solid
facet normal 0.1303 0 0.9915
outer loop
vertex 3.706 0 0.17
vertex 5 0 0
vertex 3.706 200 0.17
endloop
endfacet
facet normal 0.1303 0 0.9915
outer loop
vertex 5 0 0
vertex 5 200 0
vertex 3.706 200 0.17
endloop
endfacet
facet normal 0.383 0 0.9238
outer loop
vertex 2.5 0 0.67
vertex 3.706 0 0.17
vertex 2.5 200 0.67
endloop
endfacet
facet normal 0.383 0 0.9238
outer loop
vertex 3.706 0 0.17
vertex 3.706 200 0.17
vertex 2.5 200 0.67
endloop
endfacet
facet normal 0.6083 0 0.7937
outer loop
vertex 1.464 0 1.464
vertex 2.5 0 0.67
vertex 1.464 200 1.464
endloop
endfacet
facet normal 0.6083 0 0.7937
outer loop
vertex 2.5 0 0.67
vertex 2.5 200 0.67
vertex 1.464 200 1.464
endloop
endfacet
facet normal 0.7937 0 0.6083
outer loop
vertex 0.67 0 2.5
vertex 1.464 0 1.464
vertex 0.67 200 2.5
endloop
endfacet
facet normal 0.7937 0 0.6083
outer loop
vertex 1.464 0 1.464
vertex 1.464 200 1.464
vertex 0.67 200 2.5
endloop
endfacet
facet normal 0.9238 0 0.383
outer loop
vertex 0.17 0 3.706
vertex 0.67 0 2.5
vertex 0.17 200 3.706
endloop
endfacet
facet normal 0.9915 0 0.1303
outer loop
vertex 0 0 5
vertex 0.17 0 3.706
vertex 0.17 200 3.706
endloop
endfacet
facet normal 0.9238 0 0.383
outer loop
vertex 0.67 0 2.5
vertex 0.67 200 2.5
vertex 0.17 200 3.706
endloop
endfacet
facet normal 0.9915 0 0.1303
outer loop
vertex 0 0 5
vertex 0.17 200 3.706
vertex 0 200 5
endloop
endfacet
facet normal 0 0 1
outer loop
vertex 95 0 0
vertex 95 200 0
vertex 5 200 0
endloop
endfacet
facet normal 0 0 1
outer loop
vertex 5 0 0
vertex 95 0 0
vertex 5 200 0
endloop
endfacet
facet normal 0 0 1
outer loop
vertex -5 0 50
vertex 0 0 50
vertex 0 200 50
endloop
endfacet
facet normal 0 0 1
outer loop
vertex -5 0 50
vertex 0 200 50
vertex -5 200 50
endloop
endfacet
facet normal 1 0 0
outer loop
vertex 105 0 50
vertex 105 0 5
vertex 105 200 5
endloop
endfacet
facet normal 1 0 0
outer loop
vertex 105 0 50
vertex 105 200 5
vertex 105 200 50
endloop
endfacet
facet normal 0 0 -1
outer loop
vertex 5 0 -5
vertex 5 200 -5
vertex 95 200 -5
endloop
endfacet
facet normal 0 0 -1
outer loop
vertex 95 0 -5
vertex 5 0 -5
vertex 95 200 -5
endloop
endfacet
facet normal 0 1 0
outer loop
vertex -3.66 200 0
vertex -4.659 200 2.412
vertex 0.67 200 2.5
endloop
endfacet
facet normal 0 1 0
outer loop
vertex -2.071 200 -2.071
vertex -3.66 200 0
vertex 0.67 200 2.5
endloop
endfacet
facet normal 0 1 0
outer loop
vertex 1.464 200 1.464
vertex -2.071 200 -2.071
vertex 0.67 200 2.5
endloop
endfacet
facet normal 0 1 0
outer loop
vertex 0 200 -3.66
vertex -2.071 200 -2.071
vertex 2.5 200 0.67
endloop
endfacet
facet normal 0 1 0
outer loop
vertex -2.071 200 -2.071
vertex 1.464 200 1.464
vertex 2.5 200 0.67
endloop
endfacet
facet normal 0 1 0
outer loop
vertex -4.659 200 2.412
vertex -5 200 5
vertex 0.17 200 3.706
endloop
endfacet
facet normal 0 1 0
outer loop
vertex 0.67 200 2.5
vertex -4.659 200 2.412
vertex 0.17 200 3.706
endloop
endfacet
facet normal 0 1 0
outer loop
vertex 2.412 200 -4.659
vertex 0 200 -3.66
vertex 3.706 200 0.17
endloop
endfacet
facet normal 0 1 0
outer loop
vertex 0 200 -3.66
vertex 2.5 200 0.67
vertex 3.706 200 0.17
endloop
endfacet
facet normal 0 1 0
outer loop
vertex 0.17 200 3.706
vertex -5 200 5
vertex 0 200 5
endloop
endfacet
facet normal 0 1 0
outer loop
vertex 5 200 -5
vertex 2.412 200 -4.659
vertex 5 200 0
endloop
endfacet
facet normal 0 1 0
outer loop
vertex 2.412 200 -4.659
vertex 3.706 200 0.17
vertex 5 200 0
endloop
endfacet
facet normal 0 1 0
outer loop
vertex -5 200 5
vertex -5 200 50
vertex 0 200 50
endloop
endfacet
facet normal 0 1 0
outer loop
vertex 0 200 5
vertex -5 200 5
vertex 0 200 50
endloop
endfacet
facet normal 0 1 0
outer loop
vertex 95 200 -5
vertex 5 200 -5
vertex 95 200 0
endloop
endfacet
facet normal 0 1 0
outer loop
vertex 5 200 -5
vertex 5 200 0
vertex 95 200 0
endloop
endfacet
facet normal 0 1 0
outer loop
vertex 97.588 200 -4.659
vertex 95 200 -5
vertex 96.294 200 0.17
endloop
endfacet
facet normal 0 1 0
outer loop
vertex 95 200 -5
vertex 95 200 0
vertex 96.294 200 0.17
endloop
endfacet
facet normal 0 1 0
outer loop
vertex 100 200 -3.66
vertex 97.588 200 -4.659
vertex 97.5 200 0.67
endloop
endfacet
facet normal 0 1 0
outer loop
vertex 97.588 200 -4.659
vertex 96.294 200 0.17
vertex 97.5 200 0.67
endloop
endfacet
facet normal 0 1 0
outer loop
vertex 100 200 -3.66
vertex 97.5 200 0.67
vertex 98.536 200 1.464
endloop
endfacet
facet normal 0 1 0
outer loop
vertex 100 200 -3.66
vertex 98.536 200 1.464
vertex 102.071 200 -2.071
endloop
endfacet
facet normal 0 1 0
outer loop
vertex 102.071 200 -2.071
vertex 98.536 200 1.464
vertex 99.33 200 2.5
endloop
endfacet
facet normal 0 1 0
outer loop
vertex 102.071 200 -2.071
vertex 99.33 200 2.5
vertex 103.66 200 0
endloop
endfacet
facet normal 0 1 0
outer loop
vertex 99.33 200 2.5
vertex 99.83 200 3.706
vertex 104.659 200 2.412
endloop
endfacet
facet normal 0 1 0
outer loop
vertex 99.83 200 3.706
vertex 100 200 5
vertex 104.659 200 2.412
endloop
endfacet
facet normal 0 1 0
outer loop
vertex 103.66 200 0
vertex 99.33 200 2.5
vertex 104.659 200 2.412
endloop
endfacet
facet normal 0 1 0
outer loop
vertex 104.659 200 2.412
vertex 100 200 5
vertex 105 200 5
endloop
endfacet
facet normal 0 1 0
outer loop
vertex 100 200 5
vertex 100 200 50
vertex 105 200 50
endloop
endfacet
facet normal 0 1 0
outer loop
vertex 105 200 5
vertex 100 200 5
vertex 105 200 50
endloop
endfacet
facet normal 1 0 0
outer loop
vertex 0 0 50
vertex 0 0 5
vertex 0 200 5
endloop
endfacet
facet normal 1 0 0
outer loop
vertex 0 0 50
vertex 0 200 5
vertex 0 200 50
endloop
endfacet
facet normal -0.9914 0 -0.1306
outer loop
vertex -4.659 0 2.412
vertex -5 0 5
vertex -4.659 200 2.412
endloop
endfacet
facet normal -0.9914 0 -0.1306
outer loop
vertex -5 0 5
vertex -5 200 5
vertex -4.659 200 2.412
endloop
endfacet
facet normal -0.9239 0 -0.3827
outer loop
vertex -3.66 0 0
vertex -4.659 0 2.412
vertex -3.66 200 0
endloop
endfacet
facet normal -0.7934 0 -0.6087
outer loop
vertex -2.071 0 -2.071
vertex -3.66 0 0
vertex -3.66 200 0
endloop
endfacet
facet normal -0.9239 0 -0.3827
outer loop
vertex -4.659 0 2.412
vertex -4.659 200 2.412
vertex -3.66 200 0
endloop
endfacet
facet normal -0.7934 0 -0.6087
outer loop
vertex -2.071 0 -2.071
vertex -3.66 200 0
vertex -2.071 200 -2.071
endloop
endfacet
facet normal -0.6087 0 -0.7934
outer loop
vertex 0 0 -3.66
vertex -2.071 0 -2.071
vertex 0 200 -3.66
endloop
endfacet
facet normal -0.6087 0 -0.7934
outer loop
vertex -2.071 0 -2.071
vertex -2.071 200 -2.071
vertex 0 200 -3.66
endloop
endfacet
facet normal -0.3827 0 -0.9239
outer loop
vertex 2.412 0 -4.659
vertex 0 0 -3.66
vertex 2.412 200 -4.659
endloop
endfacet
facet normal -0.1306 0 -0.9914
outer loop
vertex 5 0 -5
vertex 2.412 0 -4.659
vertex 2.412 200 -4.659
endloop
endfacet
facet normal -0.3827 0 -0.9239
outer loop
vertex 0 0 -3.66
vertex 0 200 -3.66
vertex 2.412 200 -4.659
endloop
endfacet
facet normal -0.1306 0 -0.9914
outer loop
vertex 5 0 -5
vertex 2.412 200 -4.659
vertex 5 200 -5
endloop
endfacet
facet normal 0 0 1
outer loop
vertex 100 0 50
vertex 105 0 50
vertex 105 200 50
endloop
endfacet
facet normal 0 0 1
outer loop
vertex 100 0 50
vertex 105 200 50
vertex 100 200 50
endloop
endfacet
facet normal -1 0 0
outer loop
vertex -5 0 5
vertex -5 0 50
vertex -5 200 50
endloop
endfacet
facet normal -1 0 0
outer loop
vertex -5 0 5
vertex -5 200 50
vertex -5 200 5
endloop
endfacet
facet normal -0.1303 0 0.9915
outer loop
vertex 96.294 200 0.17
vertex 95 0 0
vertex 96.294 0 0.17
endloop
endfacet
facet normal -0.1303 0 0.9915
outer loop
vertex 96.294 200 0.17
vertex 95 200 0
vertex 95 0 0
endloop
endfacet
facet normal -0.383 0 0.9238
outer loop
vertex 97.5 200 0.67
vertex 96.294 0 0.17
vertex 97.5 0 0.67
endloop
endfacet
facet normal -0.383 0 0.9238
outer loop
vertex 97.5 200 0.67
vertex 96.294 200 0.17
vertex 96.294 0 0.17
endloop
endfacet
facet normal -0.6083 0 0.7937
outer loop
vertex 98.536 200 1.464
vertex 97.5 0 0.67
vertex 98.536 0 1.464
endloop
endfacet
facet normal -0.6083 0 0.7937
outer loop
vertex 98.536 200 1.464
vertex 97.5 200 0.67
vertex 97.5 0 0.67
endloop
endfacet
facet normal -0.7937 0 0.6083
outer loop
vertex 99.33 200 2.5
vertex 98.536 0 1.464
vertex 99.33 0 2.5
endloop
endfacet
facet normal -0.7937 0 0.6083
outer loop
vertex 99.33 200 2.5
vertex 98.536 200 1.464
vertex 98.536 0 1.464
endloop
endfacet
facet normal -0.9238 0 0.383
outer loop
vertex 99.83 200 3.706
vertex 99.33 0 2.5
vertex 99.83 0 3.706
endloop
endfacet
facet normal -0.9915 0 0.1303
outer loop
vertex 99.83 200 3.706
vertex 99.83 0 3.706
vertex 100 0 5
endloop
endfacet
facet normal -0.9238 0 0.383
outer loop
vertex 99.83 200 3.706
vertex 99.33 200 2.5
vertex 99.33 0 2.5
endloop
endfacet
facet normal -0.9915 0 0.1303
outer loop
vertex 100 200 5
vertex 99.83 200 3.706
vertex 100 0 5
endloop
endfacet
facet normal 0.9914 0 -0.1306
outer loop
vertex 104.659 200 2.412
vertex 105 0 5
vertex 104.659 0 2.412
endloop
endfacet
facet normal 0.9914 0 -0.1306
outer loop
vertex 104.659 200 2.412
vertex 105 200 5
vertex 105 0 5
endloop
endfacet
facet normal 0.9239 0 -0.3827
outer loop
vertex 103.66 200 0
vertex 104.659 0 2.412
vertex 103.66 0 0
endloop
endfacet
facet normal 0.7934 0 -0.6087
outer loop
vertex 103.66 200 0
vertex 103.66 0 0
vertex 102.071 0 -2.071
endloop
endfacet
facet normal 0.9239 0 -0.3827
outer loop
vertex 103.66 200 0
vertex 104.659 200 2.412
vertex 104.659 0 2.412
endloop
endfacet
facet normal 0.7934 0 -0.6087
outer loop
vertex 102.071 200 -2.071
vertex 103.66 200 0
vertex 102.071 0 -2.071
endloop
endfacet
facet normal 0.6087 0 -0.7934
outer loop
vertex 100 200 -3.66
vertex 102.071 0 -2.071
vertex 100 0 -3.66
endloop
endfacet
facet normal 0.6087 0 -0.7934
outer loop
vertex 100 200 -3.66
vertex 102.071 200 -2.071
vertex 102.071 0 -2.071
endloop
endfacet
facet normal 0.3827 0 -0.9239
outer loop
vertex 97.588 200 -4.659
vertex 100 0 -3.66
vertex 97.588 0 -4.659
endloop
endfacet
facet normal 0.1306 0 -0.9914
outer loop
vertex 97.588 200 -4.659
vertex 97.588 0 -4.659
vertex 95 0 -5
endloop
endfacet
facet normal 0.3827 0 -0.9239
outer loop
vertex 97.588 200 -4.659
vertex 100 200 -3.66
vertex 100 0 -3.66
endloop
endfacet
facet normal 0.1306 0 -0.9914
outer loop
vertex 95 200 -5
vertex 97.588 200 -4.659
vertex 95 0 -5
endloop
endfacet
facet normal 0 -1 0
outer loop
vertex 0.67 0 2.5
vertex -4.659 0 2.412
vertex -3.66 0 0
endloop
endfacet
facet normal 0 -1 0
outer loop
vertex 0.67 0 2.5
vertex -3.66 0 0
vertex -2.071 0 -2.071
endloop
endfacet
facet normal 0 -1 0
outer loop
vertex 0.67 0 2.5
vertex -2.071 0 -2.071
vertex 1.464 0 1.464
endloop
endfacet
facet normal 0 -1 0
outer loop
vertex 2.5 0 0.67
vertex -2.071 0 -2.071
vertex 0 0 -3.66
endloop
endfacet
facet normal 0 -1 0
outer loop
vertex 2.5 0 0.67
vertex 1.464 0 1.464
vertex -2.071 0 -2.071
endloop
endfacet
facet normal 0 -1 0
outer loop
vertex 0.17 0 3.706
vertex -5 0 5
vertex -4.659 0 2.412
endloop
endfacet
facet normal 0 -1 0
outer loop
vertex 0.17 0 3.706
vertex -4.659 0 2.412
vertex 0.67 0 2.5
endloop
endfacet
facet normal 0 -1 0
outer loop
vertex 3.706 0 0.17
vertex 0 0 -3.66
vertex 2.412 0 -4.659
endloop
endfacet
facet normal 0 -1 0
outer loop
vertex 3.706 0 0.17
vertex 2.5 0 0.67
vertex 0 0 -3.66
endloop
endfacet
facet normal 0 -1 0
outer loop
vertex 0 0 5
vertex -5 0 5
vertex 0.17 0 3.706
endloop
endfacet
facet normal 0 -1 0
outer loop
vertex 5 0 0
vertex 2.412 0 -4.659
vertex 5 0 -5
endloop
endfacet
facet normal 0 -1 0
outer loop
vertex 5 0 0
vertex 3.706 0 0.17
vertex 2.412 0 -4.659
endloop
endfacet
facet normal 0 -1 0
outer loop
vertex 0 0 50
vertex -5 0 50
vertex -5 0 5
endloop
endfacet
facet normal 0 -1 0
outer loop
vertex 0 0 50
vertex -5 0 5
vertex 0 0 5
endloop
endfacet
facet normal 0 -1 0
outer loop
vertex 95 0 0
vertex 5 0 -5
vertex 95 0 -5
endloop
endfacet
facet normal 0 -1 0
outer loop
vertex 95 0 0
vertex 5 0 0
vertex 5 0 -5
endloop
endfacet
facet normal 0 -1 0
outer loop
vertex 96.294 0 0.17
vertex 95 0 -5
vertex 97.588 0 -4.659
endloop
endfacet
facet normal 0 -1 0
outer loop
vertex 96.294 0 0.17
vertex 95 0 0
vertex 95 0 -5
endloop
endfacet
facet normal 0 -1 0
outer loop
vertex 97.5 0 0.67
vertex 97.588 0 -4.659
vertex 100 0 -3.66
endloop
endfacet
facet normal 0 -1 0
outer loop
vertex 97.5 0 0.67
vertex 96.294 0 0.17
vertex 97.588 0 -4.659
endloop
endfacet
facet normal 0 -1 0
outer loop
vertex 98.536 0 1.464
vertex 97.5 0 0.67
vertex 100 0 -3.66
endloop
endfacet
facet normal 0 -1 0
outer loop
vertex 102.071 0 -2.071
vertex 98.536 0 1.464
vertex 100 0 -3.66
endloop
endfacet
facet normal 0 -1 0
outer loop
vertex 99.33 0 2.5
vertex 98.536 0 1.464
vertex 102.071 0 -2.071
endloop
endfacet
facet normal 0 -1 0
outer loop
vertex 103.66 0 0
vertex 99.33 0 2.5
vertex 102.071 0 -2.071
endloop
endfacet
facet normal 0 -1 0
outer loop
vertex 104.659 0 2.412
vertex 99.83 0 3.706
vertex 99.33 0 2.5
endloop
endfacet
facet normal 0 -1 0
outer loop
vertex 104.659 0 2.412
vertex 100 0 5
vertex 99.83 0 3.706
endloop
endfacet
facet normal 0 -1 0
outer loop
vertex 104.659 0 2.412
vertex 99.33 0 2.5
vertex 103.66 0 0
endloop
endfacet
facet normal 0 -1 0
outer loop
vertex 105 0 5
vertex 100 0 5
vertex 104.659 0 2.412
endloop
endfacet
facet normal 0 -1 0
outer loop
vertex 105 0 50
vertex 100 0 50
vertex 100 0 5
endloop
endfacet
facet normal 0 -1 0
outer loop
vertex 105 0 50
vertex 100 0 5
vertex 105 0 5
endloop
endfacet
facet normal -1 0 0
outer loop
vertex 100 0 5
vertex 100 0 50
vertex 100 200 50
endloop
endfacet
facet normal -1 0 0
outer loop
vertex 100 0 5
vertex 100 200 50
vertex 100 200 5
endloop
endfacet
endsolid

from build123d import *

# Parameters (mm, degrees)
F1_DEPTH = 200
F2_R     = 5
F3_R     = 10


with BuildPart() as f1:
    # F0 (on Front) → F1 (new body)
    with BuildSketch(Plane.XZ):
        Polygon((100, 0), (0, 0), (0, 50), (-5, 50), (-5, -5), (105, -5), (105, 50), (100, 50), align=None)
    extrude(amount=-F1_DEPTH)

    # F2
    f2_edges = [f1.edges().sort_by_distance(p)[0] for p in [
        (0, 100, 0),
        (100, 100, 0),
    ]]
    fillet(f2_edges, radius=F2_R)

    # F3
    f3_edges = [f1.edges().sort_by_distance(p)[0] for p in [
        (105, 100, -5),
        (-5, 100, -5),
    ]]
    fillet(f3_edges, radius=F3_R)


solid = f1.part
